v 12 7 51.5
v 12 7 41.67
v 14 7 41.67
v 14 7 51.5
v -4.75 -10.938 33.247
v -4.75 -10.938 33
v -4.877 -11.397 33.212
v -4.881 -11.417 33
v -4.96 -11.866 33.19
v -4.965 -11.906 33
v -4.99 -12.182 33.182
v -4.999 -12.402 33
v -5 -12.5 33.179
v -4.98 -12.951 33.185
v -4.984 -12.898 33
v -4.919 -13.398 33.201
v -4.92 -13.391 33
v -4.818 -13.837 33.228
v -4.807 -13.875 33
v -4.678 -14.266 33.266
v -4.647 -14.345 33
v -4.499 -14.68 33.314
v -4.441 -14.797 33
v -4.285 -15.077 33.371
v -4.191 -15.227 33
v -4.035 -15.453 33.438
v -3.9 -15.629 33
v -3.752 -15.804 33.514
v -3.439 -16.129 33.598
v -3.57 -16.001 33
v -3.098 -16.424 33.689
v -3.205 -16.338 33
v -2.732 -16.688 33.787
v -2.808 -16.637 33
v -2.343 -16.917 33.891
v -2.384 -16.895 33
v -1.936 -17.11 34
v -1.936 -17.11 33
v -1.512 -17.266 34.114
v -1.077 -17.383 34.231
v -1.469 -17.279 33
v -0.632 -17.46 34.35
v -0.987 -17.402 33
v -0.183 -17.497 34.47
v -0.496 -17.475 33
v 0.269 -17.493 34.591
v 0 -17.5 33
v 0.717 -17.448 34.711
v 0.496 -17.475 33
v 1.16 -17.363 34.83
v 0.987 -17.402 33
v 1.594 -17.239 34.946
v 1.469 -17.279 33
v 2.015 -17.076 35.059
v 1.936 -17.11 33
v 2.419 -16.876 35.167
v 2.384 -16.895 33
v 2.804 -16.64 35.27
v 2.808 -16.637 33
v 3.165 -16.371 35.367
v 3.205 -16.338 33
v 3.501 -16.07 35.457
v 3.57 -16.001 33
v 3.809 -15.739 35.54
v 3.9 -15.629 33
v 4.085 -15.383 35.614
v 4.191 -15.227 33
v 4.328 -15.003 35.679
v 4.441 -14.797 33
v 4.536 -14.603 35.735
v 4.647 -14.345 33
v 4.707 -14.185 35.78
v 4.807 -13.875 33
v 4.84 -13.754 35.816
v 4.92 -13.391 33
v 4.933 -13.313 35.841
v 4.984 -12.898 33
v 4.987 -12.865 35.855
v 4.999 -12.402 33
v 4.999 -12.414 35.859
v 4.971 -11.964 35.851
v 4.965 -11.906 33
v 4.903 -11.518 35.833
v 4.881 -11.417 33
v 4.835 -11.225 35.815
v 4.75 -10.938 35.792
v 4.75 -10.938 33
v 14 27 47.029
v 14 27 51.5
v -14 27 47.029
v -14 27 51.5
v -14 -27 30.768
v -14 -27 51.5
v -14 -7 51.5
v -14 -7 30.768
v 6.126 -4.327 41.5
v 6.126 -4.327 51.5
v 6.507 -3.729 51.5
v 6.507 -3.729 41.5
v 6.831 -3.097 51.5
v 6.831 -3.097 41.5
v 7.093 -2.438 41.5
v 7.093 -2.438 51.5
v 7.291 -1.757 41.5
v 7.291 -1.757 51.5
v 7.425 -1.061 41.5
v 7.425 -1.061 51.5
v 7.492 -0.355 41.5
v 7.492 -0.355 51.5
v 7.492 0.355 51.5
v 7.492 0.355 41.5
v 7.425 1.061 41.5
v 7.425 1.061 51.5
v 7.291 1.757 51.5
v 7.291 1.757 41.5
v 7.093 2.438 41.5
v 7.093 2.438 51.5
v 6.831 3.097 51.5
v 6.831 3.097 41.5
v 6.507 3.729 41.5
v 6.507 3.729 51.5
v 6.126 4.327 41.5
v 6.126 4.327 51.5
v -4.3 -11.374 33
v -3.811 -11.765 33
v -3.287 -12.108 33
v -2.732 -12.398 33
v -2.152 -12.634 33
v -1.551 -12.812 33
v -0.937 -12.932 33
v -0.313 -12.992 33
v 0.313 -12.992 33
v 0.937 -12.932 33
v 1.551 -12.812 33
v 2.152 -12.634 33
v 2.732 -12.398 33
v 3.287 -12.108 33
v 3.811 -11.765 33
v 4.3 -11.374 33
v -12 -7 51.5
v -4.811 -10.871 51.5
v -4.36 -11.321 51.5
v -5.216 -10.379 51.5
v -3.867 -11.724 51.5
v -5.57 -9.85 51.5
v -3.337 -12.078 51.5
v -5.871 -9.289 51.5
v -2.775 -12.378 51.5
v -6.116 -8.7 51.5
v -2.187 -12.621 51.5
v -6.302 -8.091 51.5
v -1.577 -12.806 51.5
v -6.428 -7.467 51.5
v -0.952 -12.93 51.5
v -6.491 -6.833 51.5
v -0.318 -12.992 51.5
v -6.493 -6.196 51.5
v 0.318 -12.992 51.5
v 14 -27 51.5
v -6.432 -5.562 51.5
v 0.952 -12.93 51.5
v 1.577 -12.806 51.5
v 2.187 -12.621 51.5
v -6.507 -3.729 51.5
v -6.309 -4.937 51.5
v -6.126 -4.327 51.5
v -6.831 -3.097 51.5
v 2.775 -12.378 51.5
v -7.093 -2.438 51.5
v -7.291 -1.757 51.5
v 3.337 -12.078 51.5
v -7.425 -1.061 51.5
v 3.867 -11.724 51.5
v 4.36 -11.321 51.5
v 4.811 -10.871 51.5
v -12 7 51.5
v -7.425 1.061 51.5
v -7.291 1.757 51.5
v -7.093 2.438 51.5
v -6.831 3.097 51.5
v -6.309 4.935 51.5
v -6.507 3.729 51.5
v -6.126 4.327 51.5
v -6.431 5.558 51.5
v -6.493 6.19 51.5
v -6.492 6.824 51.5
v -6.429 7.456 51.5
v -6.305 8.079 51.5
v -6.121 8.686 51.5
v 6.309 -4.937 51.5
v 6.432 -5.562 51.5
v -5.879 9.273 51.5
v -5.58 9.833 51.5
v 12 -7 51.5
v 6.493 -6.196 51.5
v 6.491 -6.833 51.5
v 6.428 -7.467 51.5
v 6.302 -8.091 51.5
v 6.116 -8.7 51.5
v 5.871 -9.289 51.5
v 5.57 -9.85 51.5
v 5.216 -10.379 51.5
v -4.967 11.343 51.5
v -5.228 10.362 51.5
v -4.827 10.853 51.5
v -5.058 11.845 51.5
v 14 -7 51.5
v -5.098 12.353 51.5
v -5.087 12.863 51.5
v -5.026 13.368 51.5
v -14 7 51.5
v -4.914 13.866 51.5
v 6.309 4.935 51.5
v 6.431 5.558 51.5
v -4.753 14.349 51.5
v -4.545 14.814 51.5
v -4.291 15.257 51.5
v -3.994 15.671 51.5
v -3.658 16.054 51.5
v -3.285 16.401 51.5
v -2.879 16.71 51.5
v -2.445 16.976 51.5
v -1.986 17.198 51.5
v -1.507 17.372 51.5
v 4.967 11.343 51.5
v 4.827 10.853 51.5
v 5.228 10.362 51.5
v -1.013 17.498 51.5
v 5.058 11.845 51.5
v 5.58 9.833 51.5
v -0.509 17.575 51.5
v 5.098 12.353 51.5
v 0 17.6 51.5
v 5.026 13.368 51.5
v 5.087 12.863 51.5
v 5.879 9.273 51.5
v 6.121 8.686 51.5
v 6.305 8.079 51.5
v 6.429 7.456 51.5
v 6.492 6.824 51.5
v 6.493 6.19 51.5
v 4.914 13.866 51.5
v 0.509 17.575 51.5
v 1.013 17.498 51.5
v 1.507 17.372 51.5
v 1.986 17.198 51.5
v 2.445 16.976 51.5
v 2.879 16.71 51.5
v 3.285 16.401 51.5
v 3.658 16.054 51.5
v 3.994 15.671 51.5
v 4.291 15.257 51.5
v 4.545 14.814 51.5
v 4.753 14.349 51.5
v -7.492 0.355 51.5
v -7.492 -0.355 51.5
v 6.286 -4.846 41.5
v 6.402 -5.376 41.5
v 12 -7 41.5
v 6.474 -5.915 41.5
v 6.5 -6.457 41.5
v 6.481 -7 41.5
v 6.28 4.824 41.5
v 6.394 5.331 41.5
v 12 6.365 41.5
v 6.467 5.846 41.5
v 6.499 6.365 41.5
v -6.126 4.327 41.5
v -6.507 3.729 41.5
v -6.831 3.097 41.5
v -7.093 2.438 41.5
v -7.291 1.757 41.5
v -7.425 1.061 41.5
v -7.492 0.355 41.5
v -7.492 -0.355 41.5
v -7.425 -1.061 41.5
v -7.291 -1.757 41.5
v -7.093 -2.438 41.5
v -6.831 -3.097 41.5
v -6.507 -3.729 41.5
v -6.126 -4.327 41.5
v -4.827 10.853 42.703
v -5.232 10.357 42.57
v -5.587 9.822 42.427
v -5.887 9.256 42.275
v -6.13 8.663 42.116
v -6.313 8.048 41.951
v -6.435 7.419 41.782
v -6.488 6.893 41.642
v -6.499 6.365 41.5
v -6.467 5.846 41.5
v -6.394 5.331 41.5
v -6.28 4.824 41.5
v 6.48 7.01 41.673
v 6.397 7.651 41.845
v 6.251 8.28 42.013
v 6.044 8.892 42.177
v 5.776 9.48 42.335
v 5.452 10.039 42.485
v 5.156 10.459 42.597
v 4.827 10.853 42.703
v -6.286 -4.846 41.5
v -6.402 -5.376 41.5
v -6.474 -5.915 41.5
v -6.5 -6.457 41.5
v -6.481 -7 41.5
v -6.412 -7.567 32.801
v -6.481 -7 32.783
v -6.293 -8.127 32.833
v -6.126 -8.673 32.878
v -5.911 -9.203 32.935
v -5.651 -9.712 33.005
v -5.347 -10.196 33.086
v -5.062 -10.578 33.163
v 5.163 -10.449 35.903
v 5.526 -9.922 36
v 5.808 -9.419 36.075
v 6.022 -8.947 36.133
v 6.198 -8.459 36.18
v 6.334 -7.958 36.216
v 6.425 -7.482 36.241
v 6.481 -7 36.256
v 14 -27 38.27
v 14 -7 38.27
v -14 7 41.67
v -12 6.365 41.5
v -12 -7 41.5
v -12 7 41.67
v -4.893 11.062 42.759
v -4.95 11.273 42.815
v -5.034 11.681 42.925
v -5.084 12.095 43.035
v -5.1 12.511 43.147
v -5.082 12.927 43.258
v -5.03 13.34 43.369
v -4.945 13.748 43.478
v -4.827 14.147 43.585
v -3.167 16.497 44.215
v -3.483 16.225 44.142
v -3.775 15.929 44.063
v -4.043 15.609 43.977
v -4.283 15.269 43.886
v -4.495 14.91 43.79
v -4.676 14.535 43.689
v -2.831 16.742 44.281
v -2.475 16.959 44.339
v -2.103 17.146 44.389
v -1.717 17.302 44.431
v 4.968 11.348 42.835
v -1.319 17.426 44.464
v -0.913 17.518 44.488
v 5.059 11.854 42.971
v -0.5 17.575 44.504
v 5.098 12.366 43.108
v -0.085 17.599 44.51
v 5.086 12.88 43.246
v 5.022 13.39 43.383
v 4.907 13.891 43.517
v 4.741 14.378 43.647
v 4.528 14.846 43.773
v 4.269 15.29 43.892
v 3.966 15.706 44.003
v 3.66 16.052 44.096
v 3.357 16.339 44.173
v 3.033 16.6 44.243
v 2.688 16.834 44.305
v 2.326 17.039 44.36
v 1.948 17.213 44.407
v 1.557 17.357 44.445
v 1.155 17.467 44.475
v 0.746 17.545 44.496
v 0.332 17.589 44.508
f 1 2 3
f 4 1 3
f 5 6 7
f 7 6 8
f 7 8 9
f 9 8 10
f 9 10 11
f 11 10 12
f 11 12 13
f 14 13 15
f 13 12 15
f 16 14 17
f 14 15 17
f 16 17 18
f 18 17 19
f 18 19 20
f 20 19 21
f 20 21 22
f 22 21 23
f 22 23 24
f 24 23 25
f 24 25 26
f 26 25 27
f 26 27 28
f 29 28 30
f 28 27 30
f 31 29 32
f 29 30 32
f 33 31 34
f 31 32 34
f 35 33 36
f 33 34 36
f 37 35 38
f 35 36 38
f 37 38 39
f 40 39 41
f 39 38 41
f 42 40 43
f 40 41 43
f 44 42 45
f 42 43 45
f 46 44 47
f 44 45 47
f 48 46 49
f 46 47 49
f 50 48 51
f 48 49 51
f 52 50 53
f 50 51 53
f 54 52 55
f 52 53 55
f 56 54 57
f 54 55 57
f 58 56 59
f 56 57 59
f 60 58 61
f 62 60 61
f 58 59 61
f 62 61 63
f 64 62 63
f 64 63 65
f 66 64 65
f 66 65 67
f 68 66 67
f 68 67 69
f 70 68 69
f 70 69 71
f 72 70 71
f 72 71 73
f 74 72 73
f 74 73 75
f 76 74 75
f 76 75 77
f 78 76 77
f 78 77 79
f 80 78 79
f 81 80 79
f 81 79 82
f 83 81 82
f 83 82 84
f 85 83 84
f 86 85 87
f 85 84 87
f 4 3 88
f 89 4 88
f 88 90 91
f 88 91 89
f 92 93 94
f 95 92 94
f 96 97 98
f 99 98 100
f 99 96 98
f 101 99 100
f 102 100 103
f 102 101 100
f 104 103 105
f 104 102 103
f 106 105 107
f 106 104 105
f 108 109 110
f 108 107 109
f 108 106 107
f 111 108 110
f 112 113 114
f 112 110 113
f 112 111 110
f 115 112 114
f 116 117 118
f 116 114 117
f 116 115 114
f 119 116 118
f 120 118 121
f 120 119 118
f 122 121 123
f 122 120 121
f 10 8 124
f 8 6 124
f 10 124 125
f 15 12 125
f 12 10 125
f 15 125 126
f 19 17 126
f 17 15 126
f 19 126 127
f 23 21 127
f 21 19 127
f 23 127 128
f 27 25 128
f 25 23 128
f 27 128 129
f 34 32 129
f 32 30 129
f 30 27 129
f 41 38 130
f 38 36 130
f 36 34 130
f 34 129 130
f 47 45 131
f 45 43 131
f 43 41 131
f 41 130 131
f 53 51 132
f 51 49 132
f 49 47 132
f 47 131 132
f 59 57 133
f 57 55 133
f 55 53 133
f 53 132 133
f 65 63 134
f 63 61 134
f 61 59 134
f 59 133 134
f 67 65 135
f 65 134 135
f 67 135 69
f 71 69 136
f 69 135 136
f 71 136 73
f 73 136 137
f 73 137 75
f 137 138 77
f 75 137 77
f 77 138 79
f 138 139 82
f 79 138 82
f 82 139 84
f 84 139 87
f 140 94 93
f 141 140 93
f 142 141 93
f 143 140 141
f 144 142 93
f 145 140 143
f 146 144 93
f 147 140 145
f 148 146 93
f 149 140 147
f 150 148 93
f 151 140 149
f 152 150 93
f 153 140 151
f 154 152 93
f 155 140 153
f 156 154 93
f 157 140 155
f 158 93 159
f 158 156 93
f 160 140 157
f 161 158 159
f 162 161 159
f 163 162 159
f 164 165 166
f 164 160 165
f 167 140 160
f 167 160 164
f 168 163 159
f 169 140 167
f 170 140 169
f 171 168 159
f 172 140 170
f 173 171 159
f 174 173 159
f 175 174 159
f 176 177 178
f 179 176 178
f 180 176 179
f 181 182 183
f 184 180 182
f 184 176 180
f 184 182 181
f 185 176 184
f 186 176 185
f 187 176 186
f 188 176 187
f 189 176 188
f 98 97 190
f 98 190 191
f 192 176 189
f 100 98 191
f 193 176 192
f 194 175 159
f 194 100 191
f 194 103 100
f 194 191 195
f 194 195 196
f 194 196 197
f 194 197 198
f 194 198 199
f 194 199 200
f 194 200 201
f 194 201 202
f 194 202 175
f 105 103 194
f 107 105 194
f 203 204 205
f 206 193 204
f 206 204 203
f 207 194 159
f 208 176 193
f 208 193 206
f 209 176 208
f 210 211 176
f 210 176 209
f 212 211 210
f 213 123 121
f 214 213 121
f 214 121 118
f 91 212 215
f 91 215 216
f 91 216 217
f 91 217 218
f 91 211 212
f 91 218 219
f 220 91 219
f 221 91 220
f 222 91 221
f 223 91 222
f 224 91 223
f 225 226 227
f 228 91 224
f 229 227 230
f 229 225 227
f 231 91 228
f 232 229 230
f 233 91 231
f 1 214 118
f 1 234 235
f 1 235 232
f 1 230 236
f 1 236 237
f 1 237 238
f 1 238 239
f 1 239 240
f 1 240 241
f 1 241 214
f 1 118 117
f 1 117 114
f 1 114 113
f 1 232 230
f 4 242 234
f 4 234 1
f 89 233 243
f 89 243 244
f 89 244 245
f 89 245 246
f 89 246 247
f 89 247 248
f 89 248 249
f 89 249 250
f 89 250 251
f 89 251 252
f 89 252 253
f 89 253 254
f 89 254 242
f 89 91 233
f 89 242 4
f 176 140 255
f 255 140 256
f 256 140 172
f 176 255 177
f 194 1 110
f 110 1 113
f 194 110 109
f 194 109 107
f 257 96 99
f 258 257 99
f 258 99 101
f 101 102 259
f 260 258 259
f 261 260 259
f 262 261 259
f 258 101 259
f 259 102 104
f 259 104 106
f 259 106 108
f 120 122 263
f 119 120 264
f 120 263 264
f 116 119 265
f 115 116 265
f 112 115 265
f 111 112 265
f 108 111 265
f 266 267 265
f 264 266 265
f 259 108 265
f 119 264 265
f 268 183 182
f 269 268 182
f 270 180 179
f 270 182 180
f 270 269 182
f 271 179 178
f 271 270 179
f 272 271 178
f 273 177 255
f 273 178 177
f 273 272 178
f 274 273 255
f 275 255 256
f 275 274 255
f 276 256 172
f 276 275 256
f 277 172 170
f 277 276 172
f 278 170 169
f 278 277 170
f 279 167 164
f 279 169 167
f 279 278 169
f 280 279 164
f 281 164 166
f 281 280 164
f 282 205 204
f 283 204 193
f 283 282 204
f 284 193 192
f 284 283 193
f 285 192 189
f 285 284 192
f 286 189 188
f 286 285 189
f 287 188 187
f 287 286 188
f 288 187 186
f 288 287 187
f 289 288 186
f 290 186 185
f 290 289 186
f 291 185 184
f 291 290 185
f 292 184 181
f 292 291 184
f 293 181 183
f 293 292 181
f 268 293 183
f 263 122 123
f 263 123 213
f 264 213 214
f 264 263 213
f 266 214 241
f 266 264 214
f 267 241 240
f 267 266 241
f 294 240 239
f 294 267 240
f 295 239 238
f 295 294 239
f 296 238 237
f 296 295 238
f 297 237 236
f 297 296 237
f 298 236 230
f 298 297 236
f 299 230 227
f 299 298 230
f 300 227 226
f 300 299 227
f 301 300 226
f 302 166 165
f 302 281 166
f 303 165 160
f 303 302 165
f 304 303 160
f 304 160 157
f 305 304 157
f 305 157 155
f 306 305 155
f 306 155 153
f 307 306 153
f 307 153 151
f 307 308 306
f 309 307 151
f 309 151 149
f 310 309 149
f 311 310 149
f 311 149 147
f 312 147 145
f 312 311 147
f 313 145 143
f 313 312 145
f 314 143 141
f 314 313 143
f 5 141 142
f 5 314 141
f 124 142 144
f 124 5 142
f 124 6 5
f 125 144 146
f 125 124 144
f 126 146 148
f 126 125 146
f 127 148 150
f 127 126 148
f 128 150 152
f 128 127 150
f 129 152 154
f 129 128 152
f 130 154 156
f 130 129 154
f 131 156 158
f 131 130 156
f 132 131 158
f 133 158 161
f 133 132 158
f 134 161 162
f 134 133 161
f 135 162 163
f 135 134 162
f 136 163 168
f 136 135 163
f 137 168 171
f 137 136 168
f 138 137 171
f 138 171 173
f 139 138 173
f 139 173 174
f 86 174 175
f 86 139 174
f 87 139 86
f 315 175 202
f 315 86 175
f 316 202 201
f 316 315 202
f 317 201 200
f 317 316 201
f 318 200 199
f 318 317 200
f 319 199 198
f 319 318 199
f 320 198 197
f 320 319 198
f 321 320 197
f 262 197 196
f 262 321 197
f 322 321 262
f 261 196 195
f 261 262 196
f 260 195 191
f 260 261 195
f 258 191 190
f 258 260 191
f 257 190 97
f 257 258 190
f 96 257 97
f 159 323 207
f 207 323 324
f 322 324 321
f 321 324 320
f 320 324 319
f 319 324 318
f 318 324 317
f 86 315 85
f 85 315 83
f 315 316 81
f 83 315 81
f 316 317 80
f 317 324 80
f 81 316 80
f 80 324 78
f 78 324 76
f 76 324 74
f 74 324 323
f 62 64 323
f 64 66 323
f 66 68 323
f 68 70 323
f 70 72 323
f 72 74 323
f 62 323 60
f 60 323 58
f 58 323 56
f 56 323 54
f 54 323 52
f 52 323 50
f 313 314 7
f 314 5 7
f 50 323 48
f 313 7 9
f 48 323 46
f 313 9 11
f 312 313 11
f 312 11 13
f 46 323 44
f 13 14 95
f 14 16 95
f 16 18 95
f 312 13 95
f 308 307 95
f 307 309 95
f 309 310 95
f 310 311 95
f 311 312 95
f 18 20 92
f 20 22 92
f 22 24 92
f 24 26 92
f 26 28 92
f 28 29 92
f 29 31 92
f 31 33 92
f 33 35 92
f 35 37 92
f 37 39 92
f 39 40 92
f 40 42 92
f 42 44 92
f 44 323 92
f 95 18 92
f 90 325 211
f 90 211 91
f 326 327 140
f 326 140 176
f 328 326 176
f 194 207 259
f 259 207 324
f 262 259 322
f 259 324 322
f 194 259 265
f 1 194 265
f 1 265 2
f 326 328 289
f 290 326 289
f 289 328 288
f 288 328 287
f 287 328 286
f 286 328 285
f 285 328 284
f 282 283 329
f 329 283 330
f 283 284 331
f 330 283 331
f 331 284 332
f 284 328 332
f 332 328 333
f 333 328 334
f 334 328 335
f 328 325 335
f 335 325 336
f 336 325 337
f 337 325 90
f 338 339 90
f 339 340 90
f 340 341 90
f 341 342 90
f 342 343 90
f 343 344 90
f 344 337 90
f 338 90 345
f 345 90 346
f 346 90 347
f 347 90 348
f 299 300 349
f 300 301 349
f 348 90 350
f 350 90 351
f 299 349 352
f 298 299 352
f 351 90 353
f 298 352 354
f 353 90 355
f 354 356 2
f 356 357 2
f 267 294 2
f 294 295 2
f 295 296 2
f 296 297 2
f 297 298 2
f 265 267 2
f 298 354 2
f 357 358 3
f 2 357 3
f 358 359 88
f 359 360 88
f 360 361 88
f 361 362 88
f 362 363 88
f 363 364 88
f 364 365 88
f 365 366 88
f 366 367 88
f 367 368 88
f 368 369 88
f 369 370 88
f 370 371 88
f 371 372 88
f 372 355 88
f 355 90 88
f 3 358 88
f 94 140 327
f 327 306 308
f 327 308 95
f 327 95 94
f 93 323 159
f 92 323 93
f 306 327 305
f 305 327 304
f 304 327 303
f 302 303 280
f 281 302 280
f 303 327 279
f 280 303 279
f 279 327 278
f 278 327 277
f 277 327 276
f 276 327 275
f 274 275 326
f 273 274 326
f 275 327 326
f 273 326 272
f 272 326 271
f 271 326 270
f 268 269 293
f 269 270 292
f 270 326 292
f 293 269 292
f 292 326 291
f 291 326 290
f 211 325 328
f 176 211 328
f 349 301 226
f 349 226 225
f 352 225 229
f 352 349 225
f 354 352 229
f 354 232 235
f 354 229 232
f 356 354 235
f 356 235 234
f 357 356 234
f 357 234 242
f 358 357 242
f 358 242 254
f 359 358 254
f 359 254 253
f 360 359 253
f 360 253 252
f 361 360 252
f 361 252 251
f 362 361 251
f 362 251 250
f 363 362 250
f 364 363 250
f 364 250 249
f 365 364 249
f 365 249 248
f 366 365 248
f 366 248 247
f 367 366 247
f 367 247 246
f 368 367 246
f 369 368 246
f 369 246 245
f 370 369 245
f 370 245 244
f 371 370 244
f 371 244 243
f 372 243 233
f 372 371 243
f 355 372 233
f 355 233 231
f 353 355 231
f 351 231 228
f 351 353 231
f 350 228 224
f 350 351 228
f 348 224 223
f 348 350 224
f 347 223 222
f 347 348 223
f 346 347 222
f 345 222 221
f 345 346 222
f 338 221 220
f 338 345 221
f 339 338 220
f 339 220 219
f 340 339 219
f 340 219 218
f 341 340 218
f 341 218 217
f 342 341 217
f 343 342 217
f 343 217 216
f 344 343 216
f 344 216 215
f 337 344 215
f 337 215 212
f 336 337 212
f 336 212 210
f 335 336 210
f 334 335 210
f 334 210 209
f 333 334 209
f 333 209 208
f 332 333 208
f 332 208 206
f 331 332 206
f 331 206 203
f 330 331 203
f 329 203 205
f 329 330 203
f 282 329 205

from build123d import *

# Parameters (mm, degrees)
BOX005_W                  = 12
BOX005_H                  = 60
BOX005_DEPTH              = 30
BOX006_W                  = 12
BOX006_H                  = 60
BOX006_DEPTH              = 30
BOX004_W                  = 50
BOX004_H                  = 30
BOX004_DEPTH              = 19
BOX004_PLACEMENT_ANGLE    = 15
CYLINDER012_R             = 5.1
CYLINDER012_DEPTH         = 50
CYLINDER007_R             = 7.5
CYLINDER007_DEPTH         = 70
CYLINDER009_R             = 6.5
CYLINDER009_DEPTH         = 70
CYLINDER010_R             = 7.5
CYLINDER010_DEPTH         = 70
CYLINDER011_R             = 6.5
CYLINDER011_DEPTH         = 70
FUSION007_PLACEMENT_ANGLE = 180
CYLINDER008_R             = 5.1
CYLINDER008_DEPTH         = 70
BOX003_W                  = 57
BOX003_H                  = 59
BOX003_DEPTH              = 20
CYLINDER004_R             = 6.35
CYLINDER004_DEPTH         = 50
BOX_W                     = 40
BOX_H                     = 20
BOX_DEPTH                 = 30
BOX_PLACEMENT_ANGLE       = 15
CYLINDER001_R             = 5
CYLINDER001_DEPTH         = 50
CYLINDER006_R             = 6.35
CYLINDER006_DEPTH         = 50
BOX001_W                  = 40
BOX001_H                  = 20
BOX001_DEPTH              = 30
BOX001_PLACEMENT_ANGLE    = 15
CYLINDER005_R             = 5
CYLINDER005_DEPTH         = 50
FUSION003_PLACEMENT_ANGLE = 180
BOX002_W                  = 24
BOX002_H                  = 39
BOX002_DEPTH              = 10


with BuildPart() as cube005:
    # Box005 → Box005 (new body)
    with BuildSketch(Plane(origin=(14, -29, 23), x_dir=(1, 0, 0), z_dir=(0, 0, 1))):
        with Locations((6, 30)):
            Rectangle(BOX005_W, BOX005_H)
    extrude(amount=BOX005_DEPTH)


with BuildPart() as fusion009:
    # Box006 → Box006 (new body)
    with BuildSketch(Plane(origin=(-26, -29, 23), x_dir=(1, 0, 0), z_dir=(0, 0, 1))):
        with Locations((6, 30)):
            Rectangle(BOX006_W, BOX006_H)
    extrude(amount=BOX006_DEPTH)

    # Fusion009: union Cube005
    add(cube005.part)


with BuildPart() as cube004:
    # Box004 → Box004 (new body)
    with BuildSketch(Plane.XY):
        with Locations((25, 15)):
            Rectangle(BOX004_W, BOX004_H)
    extrude(amount=BOX004_DEPTH)


with BuildPart() as cube004_1:
    # Box004 placement: moved
    add(cube004.part.moved(Location((-24, 7.965926, 22.258819))).rotate(Axis((-24, 7.965926, 22.258819), (1, 0, 0)), BOX004_PLACEMENT_ANGLE))


with BuildPart() as bevilpin005:
    # Cylinder012 → Cylinder012 (new body)
    with BuildSketch(Plane(origin=(0, -12.5, -17), x_dir=(1, 0, 0), z_dir=(0, 0, 1))):
        Circle(CYLINDER012_R)
    extrude(amount=CYLINDER012_DEPTH)


with BuildPart() as bevilpin003:
    # Cylinder007 → Cylinder007 (new body)
    with BuildSketch(Plane.XY):
        Circle(CYLINDER007_R)
    extrude(amount=CYLINDER007_DEPTH)


with BuildPart() as fusion006:
    # Cylinder009 → Cylinder009 (new body)
    with BuildSketch(Plane(origin=(0, 6.5, 0), x_dir=(1, 0, 0), z_dir=(0, 0, 1))):
        Circle(CYLINDER009_R)
    extrude(amount=CYLINDER009_DEPTH)

    # Fusion006: union bevilPin003
    add(bevilpin003.part)


with BuildPart() as bevilpin004:
    # Cylinder010 → Cylinder010 (new body)
    with BuildSketch(Plane.XY):
        Circle(CYLINDER010_R)
    extrude(amount=CYLINDER010_DEPTH)


with BuildPart() as fusion008:
    # Cylinder011 → Cylinder011 (new body)
    with BuildSketch(Plane(origin=(0, 6.5, 0), x_dir=(1, 0, 0), z_dir=(0, 0, 1))):
        Circle(CYLINDER011_R)
    extrude(amount=CYLINDER011_DEPTH)

    # Fusion007: union bevilPin004
    add(bevilpin004.part)


with BuildPart() as fusion008_1:
    # Fusion007 placement: moved
    add(fusion008.part.rotate(Axis((0, 0, 0), (0, 0, 1)), FUSION007_PLACEMENT_ANGLE))

    # Fusion008: union Fusion006
    add(fusion006.part)


with BuildPart() as cylinder008:
    # Cylinder008 → Cylinder008 (new body)
    with BuildSketch(Plane(origin=(0, 12.5, 0), x_dir=(1, 0, 0), z_dir=(0, 0, 1))):
        Circle(CYLINDER008_R)
    extrude(amount=CYLINDER008_DEPTH)


with BuildPart() as cube003:
    # Box003 → Box003 (new body)
    with BuildSketch(Plane(origin=(-29.5, -29, 51.5), x_dir=(1, 0, 0), z_dir=(0, 0, 1))):
        with Locations((28.5, 29.5)):
            Rectangle(BOX003_W, BOX003_H)
    extrude(amount=BOX003_DEPTH)


with BuildPart() as bevilpin001:
    # Cylinder004 → Cylinder004 (new body)
    with BuildSketch(Plane.XY):
        Circle(CYLINDER004_R)
    extrude(amount=CYLINDER004_DEPTH)


with BuildPart() as cube:
    # Box → Box (new body)
    with BuildSketch(Plane.XY):
        with Locations((20, 10)):
            Rectangle(BOX_W, BOX_H)
    extrude(amount=BOX_DEPTH)


with BuildPart() as cube_1:
    # Box placement: moved
    add(cube.part.moved(Location((-19.558238, 7, 39.759763))).rotate(Axis((-19.558238, 7, 39.759763), (0, 1, 0)), BOX_PLACEMENT_ANGLE))


with BuildPart() as fusion001:
    # Cylinder001 → Cylinder001 (new body)
    with BuildSketch(Plane(origin=(0, 12.5, 0), x_dir=(1, 0, 0), z_dir=(0, 0, 1))):
        Circle(CYLINDER001_R)
    extrude(amount=CYLINDER001_DEPTH)

    # Fusion: union Cube
    add(cube_1.part)

    # Fusion001: union bevilPin001
    add(bevilpin001.part)


with BuildPart() as bevilpin002:
    # Cylinder006 → Cylinder006 (new body)
    with BuildSketch(Plane.XY):
        Circle(CYLINDER006_R)
    extrude(amount=CYLINDER006_DEPTH)


with BuildPart() as cube001:
    # Box001 → Box001 (new body)
    with BuildSketch(Plane.XY):
        with Locations((20, 10)):
            Rectangle(BOX001_W, BOX001_H)
    extrude(amount=BOX001_DEPTH)


with BuildPart() as cube001_1:
    # Box001 placement: moved
    add(cube001.part.moved(Location((-19.558238, 7, 39.759763))).rotate(Axis((-19.558238, 7, 39.759763), (0, 1, 0)), BOX001_PLACEMENT_ANGLE))


with BuildPart() as fusion004:
    # Cylinder005 → Cylinder005 (new body)
    with BuildSketch(Plane(origin=(0, 12.5, 0), x_dir=(1, 0, 0), z_dir=(0, 0, 1))):
        Circle(CYLINDER005_R)
    extrude(amount=CYLINDER005_DEPTH)

    # Fusion002: union Cube001
    add(cube001_1.part)

    # Fusion003: union bevilPin002
    add(bevilpin002.part)


with BuildPart() as fusion004_1:
    # Fusion003 placement: moved
    add(fusion004.part.rotate(Axis((0, 0, 0), (0, 0, 1)), FUSION003_PLACEMENT_ANGLE))

    # Fusion004: union Fusion001
    add(fusion001.part)


with BuildPart() as cut005:
    # Box002 → Box002 (new body)
    with BuildSketch(Plane(origin=(-12, -13, 41.5), x_dir=(1, 0, 0), z_dir=(0, 0, 1))):
        with Locations((12, 19.5)):
            Rectangle(BOX002_W, BOX002_H)
    extrude(amount=BOX002_DEPTH)

    # Fusion005: union Fusion004
    add(fusion004_1.part)

    # Cut: cut Cube003
    add(cube003.part, mode=Mode.SUBTRACT)

    # Cut001: cut Cylinder008
    add(cylinder008.part, mode=Mode.SUBTRACT)

    # Cut002: cut Fusion008
    add(fusion008_1.part, mode=Mode.SUBTRACT)

    # Cut003: cut bevilPin005
    add(bevilpin005.part, mode=Mode.SUBTRACT)

    # Cut004: cut Cube004
    add(cube004_1.part, mode=Mode.SUBTRACT)

    # Cut005: cut Fusion009
    add(fusion009.part, mode=Mode.SUBTRACT)


solid = cut005.part
